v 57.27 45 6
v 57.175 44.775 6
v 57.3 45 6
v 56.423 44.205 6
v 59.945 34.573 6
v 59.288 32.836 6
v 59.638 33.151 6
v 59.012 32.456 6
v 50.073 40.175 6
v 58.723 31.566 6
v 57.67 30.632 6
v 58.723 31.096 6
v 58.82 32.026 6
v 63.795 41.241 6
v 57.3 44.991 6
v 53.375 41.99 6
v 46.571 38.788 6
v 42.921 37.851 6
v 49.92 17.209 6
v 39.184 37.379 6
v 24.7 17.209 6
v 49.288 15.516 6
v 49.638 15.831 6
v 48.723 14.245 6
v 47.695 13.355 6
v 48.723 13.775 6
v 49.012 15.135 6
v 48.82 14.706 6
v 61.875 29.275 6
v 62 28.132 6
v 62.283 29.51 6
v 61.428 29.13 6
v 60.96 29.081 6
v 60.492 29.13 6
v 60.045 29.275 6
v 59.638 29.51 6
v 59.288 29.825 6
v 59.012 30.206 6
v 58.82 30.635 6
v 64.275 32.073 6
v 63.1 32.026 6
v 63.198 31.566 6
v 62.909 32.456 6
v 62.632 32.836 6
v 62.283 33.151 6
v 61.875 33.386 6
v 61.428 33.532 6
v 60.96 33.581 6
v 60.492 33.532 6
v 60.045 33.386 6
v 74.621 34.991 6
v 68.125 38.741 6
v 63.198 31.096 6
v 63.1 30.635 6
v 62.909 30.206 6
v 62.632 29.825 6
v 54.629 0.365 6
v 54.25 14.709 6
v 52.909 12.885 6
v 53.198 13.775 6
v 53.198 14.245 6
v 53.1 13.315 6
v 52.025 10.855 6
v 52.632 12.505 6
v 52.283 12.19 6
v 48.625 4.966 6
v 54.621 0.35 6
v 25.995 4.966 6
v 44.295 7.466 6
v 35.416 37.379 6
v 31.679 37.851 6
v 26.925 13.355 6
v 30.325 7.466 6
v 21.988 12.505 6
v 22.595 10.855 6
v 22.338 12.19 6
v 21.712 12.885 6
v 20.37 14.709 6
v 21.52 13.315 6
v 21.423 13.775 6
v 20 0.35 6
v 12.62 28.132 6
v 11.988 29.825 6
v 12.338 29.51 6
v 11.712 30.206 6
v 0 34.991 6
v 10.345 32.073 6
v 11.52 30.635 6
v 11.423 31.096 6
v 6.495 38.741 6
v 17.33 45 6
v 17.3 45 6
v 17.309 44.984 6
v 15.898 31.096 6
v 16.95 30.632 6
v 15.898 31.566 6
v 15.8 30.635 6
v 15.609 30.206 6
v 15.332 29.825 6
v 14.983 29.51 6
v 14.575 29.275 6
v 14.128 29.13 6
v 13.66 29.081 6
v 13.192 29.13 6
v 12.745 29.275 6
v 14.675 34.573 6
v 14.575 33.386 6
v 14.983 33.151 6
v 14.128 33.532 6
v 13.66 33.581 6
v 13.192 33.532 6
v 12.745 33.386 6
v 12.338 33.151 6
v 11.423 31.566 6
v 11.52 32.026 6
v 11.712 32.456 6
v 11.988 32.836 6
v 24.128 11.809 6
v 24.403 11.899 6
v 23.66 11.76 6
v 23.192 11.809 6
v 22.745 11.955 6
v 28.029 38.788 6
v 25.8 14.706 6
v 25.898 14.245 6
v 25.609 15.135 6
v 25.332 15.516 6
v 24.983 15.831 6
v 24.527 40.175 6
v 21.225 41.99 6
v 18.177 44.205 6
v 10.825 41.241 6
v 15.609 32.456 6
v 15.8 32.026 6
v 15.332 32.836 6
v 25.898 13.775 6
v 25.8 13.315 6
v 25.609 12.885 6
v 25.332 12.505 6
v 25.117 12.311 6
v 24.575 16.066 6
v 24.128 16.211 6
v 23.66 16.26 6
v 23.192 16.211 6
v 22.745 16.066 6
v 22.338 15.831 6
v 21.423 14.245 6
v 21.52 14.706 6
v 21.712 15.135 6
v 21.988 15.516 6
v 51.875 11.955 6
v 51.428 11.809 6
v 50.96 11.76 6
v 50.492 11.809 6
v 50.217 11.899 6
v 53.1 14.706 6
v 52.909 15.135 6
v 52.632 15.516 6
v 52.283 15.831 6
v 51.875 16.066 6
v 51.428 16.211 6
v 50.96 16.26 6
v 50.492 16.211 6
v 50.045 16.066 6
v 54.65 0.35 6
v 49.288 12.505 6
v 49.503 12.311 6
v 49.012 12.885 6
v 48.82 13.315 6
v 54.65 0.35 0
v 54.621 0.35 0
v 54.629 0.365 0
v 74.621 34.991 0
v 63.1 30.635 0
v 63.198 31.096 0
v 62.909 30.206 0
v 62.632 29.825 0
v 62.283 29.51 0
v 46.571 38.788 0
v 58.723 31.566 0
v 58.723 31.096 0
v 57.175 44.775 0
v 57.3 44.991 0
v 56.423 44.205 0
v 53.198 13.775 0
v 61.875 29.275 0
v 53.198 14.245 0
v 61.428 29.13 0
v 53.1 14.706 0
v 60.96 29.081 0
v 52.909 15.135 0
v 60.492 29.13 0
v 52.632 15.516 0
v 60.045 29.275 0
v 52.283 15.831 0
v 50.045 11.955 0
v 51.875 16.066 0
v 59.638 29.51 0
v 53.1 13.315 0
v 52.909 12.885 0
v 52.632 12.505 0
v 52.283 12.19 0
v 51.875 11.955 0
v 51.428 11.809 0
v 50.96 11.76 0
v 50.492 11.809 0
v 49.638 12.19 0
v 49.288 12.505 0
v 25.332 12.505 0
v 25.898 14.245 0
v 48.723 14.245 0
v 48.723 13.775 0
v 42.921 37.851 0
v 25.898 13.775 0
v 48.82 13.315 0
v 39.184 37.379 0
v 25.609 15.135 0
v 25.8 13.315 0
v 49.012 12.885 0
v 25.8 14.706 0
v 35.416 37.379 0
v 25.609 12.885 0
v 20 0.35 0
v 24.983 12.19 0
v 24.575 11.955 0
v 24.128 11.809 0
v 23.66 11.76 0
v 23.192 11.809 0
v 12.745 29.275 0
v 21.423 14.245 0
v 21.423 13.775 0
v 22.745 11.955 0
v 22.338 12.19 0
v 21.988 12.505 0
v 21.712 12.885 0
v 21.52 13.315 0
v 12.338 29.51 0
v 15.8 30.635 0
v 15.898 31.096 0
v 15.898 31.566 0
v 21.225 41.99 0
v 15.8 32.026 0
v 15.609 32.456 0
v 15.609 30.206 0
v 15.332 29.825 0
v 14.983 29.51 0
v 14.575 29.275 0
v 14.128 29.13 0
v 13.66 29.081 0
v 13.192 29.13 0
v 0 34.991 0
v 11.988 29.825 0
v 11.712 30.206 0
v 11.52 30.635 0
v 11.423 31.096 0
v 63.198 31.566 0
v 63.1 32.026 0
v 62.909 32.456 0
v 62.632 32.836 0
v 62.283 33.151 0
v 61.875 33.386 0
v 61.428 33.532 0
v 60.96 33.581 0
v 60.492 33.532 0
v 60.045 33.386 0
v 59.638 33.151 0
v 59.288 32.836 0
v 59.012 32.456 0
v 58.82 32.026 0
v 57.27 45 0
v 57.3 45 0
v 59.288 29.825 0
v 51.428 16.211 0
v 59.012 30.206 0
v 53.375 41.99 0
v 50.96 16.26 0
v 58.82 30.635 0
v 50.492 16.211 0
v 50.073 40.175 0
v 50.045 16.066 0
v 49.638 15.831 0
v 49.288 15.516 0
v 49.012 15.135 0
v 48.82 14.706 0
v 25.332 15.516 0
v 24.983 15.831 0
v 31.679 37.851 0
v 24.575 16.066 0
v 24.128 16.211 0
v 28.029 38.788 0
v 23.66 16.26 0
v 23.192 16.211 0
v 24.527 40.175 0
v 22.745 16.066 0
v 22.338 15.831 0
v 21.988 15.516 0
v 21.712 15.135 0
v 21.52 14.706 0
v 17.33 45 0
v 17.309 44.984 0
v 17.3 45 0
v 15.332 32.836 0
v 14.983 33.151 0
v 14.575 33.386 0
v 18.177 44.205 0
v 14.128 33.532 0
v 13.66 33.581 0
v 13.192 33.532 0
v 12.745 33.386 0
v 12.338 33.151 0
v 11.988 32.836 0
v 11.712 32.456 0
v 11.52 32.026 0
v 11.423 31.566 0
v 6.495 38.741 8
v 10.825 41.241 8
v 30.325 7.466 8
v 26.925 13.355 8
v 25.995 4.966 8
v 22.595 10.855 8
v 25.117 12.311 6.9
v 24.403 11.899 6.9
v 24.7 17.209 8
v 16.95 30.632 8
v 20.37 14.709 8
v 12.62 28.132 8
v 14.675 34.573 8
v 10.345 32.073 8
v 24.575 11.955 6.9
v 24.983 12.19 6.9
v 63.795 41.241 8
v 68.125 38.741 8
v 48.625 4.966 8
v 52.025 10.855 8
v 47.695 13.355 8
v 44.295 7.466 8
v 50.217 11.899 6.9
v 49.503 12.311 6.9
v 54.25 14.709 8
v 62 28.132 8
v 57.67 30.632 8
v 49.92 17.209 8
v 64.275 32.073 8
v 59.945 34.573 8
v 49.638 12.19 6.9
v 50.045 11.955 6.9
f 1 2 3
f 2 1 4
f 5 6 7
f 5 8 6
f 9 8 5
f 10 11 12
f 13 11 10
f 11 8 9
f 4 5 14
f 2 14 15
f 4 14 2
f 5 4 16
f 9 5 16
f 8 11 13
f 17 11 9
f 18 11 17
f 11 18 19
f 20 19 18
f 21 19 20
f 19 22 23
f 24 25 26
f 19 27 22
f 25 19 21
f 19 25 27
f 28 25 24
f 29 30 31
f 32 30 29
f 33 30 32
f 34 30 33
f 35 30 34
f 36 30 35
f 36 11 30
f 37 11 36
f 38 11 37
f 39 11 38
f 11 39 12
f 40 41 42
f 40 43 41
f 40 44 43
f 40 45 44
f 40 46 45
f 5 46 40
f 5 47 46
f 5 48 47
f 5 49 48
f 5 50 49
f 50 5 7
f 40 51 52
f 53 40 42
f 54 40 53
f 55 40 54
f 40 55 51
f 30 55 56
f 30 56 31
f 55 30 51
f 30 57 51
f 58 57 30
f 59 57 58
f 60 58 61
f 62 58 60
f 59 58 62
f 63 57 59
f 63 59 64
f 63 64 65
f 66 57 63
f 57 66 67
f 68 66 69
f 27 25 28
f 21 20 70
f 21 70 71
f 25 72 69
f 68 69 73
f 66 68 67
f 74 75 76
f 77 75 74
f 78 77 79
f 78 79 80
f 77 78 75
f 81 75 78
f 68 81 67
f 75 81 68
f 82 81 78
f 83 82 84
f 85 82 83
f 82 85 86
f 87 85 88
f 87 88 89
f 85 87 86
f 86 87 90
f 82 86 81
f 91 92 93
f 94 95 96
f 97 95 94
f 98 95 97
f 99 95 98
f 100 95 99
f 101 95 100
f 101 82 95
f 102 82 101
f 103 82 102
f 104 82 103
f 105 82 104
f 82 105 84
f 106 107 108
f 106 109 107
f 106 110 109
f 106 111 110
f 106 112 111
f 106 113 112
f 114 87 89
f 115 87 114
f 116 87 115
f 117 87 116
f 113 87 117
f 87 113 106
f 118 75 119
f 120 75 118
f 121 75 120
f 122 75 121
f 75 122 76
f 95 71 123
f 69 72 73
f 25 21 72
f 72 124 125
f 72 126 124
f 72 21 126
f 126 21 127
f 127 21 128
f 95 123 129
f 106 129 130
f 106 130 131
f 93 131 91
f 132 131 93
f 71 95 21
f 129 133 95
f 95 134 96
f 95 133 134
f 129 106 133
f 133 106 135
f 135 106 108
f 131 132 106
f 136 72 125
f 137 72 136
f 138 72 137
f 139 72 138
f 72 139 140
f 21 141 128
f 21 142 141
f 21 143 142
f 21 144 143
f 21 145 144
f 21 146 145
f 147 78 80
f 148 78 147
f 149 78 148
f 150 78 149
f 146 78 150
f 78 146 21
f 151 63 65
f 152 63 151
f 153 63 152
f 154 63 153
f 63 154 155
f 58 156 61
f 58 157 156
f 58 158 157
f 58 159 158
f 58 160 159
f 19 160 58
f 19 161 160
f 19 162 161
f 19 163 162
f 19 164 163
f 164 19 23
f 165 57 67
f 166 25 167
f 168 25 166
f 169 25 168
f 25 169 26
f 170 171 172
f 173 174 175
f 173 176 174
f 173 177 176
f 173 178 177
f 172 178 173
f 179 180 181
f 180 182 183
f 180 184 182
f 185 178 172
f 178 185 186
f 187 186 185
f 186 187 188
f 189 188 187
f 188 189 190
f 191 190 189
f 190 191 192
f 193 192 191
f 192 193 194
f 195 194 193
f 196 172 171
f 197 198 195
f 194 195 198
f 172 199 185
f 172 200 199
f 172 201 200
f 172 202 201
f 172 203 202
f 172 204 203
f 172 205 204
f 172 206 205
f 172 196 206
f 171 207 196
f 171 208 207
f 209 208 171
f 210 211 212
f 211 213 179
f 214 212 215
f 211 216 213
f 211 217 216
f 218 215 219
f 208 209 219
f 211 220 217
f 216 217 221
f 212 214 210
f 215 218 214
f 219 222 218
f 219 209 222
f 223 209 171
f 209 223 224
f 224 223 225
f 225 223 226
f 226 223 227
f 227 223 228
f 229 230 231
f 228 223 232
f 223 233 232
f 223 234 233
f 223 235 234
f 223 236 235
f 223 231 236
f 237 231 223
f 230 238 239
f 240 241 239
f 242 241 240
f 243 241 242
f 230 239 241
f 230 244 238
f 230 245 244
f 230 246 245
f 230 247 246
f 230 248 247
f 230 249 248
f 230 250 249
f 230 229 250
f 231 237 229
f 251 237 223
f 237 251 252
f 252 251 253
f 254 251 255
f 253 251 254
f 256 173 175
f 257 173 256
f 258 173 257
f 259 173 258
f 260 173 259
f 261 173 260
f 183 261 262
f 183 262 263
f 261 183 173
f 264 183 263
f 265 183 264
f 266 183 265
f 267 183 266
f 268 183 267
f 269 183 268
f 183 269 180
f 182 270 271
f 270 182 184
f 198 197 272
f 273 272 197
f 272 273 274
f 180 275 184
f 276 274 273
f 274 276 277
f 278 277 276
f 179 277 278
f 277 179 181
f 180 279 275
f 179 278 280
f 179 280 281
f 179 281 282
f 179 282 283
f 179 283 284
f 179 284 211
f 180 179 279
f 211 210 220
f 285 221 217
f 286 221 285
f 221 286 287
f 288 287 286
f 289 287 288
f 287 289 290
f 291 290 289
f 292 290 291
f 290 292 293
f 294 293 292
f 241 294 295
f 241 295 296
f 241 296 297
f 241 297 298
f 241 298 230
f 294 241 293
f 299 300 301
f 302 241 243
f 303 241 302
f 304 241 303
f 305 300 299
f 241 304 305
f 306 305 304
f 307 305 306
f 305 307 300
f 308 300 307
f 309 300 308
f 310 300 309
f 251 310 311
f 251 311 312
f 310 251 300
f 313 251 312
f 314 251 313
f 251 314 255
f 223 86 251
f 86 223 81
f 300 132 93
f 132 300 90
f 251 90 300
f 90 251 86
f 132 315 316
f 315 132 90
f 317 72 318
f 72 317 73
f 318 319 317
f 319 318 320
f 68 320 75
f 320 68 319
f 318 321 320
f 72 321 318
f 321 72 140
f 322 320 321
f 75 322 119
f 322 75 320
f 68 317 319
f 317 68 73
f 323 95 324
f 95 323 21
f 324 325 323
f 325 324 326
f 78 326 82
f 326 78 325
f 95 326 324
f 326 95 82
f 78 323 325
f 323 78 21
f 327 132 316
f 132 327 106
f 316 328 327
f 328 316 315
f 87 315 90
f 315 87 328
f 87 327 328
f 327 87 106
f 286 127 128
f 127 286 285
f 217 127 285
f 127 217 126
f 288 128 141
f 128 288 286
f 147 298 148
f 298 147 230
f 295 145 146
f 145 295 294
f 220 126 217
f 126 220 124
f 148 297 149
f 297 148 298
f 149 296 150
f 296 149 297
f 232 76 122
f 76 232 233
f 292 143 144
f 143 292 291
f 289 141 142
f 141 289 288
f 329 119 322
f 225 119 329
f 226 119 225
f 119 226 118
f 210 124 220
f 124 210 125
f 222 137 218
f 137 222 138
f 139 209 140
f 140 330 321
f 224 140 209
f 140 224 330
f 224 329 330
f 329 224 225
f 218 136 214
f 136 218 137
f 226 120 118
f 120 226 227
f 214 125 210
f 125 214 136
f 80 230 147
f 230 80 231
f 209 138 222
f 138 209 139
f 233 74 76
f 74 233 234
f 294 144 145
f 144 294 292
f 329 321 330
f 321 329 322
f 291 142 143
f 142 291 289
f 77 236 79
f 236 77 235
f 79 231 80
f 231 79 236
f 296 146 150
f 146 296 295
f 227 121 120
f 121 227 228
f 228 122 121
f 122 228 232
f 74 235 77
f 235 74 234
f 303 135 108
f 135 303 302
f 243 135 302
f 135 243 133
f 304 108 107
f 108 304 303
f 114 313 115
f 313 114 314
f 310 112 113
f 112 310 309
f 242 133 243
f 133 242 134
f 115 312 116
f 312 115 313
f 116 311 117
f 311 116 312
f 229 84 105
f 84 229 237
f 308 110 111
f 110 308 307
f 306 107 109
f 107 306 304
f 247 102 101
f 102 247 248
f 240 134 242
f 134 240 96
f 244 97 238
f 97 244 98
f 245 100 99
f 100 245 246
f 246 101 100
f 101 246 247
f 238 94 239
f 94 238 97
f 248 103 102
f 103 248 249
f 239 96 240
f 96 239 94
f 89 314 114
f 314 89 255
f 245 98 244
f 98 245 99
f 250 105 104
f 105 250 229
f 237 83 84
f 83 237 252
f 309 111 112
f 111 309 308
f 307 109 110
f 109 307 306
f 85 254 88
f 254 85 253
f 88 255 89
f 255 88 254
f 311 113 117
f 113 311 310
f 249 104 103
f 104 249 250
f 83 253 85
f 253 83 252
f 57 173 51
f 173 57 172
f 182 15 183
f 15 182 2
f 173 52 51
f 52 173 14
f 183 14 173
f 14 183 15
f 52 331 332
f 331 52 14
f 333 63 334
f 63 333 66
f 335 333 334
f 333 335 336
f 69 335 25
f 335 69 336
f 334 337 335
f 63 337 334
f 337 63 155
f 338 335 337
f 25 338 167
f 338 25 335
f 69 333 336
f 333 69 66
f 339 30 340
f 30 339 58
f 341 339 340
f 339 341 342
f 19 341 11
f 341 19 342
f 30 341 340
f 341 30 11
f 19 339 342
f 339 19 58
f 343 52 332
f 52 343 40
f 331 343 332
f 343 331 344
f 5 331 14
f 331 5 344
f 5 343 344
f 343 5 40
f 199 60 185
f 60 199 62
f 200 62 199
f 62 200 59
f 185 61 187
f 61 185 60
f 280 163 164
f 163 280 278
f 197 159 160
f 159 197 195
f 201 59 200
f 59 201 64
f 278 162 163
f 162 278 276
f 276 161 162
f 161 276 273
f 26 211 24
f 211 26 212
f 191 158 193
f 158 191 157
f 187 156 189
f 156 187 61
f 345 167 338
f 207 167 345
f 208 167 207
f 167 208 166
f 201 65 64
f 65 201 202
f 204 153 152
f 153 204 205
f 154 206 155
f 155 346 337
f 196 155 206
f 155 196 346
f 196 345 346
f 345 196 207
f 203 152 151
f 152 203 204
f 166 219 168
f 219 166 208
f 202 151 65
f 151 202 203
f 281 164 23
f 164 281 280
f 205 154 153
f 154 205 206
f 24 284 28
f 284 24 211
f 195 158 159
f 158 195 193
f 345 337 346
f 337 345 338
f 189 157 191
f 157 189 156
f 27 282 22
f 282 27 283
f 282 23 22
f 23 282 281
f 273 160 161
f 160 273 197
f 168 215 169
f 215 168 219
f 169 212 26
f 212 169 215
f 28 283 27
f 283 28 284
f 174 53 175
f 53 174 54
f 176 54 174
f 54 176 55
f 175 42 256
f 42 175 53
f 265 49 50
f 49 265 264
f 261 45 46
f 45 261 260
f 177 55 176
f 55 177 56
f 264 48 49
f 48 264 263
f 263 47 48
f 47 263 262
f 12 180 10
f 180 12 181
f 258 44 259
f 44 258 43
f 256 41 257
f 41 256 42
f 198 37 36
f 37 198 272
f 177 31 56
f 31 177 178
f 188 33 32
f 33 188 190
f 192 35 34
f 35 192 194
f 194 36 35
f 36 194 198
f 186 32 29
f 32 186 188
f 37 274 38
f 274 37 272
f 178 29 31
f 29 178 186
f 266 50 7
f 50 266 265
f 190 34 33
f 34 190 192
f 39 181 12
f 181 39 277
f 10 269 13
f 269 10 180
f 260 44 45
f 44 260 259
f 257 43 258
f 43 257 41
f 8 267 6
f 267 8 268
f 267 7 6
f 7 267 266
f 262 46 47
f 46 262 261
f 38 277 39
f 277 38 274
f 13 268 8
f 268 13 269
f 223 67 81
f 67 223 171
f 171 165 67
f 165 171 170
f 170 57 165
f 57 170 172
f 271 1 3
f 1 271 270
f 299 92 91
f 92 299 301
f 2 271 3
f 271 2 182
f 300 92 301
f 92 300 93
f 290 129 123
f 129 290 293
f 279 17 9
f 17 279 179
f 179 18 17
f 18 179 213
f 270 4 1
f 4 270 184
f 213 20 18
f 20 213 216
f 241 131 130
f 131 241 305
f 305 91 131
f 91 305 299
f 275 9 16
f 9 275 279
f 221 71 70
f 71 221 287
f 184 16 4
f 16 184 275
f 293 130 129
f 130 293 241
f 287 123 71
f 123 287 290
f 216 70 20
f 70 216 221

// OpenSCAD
// file: metric.scad
// PRUSA Mendel  
// Default metric sizes
// GNU GPL v3
// Josef Průša
// josefprusa@me.com
// prusadjs.cz
// http://www.reprap.org/wiki/Prusa_Mendel
// http://github.com/prusajr/PrusaMendel

// DONT CHANGE THIS FILE! ALTER VALUES IN CONFIGURATION.SCAD INSTEAD

// RODS

threaded_rod_diameter = 8.7;
threaded_rod_diameter_horizontal = 8.7;
smooth_bar_diameter = 8;
smooth_bar_diameter_horizontal = 8.5;

// Nuts and bolts

m8_diameter = 9;
m8_nut_diameter = 14.1;

m4_diameter = 4.5;
m4_nut_diameter = 8.5;

m3_diameter = 3.6;
m3_nut_diameter = 5.3;
m3_nut_diameter_horizontal = 6.1;

// Bushing holder

bushing_core_diameter = smooth_bar_diameter;
bushing_material_thickness = 1;

// Motors

motor_shaft = 5.5;
// main file
// C. Strang		
// cstrang@????
// funfor.us

include <metric.scad>;

$fn=30;

part();



module part()
{
	#translate([20,0.35,0]) rotate([0,0,30]) rail();
	#translate([37.3,10.35,0]) rotate([0,0,-30]) rail();
	#translate([20,0.35,0]) rotate([0,0,0]) base1();
//	#translate([-47,0,0]) rotate([0,0,0]) base2();
	#translate([57.3,45,0]) rotate([0,0,180]) base2();
}

module base1()
{
	difference()
	{
		translate([0,0,0]) rotate([0,0,0]) cube([34.65,13,6]);
		translate([0,0,-0.1]) rotate([0,0,35]) cube([34.65,13,7]);
		translate([34.65,0,-0.1]) rotate([0,0,55]) cube([13,34.65,7]);

	}

}

module base2()
{
	difference()
	{
		translate([0,0,0]) rotate([0,0,0]) cube([40.0,35,6]);
		translate([0,0,-0.1]) rotate([0,0,61]) cube([40,23,7]);
		translate([40.0,0,-0.1]) rotate([0,0,29]) cube([23,40,7]);
		translate([20.0,-22.32,-0.1]) rotate([0,0,0]) cylinder(r=30,h=7,$fn=50);

	}

}


module rail()
{
	difference()
		{
			union()
			{	
				translate([0,0,0])cube([20,40,6]);
				translate([7.5,1,5.9]) rotate([0,0,0]) cube([5,6.8,2.1]);
				translate([7.5,12.25,5.9]) rotate([0,0,0]) cube([5,15.5,2.1]);
				translate([7.5,32.3,5.9]) rotate([0,0,0]) cube([5,7.7,2.1]);
			}
			translate([10,10,-0.1]) cylinder(r=m4_diameter/2,h=7);
 			translate([10,30,-0.1]) cylinder(r=m4_diameter/2,h=7);
		}
}

 
